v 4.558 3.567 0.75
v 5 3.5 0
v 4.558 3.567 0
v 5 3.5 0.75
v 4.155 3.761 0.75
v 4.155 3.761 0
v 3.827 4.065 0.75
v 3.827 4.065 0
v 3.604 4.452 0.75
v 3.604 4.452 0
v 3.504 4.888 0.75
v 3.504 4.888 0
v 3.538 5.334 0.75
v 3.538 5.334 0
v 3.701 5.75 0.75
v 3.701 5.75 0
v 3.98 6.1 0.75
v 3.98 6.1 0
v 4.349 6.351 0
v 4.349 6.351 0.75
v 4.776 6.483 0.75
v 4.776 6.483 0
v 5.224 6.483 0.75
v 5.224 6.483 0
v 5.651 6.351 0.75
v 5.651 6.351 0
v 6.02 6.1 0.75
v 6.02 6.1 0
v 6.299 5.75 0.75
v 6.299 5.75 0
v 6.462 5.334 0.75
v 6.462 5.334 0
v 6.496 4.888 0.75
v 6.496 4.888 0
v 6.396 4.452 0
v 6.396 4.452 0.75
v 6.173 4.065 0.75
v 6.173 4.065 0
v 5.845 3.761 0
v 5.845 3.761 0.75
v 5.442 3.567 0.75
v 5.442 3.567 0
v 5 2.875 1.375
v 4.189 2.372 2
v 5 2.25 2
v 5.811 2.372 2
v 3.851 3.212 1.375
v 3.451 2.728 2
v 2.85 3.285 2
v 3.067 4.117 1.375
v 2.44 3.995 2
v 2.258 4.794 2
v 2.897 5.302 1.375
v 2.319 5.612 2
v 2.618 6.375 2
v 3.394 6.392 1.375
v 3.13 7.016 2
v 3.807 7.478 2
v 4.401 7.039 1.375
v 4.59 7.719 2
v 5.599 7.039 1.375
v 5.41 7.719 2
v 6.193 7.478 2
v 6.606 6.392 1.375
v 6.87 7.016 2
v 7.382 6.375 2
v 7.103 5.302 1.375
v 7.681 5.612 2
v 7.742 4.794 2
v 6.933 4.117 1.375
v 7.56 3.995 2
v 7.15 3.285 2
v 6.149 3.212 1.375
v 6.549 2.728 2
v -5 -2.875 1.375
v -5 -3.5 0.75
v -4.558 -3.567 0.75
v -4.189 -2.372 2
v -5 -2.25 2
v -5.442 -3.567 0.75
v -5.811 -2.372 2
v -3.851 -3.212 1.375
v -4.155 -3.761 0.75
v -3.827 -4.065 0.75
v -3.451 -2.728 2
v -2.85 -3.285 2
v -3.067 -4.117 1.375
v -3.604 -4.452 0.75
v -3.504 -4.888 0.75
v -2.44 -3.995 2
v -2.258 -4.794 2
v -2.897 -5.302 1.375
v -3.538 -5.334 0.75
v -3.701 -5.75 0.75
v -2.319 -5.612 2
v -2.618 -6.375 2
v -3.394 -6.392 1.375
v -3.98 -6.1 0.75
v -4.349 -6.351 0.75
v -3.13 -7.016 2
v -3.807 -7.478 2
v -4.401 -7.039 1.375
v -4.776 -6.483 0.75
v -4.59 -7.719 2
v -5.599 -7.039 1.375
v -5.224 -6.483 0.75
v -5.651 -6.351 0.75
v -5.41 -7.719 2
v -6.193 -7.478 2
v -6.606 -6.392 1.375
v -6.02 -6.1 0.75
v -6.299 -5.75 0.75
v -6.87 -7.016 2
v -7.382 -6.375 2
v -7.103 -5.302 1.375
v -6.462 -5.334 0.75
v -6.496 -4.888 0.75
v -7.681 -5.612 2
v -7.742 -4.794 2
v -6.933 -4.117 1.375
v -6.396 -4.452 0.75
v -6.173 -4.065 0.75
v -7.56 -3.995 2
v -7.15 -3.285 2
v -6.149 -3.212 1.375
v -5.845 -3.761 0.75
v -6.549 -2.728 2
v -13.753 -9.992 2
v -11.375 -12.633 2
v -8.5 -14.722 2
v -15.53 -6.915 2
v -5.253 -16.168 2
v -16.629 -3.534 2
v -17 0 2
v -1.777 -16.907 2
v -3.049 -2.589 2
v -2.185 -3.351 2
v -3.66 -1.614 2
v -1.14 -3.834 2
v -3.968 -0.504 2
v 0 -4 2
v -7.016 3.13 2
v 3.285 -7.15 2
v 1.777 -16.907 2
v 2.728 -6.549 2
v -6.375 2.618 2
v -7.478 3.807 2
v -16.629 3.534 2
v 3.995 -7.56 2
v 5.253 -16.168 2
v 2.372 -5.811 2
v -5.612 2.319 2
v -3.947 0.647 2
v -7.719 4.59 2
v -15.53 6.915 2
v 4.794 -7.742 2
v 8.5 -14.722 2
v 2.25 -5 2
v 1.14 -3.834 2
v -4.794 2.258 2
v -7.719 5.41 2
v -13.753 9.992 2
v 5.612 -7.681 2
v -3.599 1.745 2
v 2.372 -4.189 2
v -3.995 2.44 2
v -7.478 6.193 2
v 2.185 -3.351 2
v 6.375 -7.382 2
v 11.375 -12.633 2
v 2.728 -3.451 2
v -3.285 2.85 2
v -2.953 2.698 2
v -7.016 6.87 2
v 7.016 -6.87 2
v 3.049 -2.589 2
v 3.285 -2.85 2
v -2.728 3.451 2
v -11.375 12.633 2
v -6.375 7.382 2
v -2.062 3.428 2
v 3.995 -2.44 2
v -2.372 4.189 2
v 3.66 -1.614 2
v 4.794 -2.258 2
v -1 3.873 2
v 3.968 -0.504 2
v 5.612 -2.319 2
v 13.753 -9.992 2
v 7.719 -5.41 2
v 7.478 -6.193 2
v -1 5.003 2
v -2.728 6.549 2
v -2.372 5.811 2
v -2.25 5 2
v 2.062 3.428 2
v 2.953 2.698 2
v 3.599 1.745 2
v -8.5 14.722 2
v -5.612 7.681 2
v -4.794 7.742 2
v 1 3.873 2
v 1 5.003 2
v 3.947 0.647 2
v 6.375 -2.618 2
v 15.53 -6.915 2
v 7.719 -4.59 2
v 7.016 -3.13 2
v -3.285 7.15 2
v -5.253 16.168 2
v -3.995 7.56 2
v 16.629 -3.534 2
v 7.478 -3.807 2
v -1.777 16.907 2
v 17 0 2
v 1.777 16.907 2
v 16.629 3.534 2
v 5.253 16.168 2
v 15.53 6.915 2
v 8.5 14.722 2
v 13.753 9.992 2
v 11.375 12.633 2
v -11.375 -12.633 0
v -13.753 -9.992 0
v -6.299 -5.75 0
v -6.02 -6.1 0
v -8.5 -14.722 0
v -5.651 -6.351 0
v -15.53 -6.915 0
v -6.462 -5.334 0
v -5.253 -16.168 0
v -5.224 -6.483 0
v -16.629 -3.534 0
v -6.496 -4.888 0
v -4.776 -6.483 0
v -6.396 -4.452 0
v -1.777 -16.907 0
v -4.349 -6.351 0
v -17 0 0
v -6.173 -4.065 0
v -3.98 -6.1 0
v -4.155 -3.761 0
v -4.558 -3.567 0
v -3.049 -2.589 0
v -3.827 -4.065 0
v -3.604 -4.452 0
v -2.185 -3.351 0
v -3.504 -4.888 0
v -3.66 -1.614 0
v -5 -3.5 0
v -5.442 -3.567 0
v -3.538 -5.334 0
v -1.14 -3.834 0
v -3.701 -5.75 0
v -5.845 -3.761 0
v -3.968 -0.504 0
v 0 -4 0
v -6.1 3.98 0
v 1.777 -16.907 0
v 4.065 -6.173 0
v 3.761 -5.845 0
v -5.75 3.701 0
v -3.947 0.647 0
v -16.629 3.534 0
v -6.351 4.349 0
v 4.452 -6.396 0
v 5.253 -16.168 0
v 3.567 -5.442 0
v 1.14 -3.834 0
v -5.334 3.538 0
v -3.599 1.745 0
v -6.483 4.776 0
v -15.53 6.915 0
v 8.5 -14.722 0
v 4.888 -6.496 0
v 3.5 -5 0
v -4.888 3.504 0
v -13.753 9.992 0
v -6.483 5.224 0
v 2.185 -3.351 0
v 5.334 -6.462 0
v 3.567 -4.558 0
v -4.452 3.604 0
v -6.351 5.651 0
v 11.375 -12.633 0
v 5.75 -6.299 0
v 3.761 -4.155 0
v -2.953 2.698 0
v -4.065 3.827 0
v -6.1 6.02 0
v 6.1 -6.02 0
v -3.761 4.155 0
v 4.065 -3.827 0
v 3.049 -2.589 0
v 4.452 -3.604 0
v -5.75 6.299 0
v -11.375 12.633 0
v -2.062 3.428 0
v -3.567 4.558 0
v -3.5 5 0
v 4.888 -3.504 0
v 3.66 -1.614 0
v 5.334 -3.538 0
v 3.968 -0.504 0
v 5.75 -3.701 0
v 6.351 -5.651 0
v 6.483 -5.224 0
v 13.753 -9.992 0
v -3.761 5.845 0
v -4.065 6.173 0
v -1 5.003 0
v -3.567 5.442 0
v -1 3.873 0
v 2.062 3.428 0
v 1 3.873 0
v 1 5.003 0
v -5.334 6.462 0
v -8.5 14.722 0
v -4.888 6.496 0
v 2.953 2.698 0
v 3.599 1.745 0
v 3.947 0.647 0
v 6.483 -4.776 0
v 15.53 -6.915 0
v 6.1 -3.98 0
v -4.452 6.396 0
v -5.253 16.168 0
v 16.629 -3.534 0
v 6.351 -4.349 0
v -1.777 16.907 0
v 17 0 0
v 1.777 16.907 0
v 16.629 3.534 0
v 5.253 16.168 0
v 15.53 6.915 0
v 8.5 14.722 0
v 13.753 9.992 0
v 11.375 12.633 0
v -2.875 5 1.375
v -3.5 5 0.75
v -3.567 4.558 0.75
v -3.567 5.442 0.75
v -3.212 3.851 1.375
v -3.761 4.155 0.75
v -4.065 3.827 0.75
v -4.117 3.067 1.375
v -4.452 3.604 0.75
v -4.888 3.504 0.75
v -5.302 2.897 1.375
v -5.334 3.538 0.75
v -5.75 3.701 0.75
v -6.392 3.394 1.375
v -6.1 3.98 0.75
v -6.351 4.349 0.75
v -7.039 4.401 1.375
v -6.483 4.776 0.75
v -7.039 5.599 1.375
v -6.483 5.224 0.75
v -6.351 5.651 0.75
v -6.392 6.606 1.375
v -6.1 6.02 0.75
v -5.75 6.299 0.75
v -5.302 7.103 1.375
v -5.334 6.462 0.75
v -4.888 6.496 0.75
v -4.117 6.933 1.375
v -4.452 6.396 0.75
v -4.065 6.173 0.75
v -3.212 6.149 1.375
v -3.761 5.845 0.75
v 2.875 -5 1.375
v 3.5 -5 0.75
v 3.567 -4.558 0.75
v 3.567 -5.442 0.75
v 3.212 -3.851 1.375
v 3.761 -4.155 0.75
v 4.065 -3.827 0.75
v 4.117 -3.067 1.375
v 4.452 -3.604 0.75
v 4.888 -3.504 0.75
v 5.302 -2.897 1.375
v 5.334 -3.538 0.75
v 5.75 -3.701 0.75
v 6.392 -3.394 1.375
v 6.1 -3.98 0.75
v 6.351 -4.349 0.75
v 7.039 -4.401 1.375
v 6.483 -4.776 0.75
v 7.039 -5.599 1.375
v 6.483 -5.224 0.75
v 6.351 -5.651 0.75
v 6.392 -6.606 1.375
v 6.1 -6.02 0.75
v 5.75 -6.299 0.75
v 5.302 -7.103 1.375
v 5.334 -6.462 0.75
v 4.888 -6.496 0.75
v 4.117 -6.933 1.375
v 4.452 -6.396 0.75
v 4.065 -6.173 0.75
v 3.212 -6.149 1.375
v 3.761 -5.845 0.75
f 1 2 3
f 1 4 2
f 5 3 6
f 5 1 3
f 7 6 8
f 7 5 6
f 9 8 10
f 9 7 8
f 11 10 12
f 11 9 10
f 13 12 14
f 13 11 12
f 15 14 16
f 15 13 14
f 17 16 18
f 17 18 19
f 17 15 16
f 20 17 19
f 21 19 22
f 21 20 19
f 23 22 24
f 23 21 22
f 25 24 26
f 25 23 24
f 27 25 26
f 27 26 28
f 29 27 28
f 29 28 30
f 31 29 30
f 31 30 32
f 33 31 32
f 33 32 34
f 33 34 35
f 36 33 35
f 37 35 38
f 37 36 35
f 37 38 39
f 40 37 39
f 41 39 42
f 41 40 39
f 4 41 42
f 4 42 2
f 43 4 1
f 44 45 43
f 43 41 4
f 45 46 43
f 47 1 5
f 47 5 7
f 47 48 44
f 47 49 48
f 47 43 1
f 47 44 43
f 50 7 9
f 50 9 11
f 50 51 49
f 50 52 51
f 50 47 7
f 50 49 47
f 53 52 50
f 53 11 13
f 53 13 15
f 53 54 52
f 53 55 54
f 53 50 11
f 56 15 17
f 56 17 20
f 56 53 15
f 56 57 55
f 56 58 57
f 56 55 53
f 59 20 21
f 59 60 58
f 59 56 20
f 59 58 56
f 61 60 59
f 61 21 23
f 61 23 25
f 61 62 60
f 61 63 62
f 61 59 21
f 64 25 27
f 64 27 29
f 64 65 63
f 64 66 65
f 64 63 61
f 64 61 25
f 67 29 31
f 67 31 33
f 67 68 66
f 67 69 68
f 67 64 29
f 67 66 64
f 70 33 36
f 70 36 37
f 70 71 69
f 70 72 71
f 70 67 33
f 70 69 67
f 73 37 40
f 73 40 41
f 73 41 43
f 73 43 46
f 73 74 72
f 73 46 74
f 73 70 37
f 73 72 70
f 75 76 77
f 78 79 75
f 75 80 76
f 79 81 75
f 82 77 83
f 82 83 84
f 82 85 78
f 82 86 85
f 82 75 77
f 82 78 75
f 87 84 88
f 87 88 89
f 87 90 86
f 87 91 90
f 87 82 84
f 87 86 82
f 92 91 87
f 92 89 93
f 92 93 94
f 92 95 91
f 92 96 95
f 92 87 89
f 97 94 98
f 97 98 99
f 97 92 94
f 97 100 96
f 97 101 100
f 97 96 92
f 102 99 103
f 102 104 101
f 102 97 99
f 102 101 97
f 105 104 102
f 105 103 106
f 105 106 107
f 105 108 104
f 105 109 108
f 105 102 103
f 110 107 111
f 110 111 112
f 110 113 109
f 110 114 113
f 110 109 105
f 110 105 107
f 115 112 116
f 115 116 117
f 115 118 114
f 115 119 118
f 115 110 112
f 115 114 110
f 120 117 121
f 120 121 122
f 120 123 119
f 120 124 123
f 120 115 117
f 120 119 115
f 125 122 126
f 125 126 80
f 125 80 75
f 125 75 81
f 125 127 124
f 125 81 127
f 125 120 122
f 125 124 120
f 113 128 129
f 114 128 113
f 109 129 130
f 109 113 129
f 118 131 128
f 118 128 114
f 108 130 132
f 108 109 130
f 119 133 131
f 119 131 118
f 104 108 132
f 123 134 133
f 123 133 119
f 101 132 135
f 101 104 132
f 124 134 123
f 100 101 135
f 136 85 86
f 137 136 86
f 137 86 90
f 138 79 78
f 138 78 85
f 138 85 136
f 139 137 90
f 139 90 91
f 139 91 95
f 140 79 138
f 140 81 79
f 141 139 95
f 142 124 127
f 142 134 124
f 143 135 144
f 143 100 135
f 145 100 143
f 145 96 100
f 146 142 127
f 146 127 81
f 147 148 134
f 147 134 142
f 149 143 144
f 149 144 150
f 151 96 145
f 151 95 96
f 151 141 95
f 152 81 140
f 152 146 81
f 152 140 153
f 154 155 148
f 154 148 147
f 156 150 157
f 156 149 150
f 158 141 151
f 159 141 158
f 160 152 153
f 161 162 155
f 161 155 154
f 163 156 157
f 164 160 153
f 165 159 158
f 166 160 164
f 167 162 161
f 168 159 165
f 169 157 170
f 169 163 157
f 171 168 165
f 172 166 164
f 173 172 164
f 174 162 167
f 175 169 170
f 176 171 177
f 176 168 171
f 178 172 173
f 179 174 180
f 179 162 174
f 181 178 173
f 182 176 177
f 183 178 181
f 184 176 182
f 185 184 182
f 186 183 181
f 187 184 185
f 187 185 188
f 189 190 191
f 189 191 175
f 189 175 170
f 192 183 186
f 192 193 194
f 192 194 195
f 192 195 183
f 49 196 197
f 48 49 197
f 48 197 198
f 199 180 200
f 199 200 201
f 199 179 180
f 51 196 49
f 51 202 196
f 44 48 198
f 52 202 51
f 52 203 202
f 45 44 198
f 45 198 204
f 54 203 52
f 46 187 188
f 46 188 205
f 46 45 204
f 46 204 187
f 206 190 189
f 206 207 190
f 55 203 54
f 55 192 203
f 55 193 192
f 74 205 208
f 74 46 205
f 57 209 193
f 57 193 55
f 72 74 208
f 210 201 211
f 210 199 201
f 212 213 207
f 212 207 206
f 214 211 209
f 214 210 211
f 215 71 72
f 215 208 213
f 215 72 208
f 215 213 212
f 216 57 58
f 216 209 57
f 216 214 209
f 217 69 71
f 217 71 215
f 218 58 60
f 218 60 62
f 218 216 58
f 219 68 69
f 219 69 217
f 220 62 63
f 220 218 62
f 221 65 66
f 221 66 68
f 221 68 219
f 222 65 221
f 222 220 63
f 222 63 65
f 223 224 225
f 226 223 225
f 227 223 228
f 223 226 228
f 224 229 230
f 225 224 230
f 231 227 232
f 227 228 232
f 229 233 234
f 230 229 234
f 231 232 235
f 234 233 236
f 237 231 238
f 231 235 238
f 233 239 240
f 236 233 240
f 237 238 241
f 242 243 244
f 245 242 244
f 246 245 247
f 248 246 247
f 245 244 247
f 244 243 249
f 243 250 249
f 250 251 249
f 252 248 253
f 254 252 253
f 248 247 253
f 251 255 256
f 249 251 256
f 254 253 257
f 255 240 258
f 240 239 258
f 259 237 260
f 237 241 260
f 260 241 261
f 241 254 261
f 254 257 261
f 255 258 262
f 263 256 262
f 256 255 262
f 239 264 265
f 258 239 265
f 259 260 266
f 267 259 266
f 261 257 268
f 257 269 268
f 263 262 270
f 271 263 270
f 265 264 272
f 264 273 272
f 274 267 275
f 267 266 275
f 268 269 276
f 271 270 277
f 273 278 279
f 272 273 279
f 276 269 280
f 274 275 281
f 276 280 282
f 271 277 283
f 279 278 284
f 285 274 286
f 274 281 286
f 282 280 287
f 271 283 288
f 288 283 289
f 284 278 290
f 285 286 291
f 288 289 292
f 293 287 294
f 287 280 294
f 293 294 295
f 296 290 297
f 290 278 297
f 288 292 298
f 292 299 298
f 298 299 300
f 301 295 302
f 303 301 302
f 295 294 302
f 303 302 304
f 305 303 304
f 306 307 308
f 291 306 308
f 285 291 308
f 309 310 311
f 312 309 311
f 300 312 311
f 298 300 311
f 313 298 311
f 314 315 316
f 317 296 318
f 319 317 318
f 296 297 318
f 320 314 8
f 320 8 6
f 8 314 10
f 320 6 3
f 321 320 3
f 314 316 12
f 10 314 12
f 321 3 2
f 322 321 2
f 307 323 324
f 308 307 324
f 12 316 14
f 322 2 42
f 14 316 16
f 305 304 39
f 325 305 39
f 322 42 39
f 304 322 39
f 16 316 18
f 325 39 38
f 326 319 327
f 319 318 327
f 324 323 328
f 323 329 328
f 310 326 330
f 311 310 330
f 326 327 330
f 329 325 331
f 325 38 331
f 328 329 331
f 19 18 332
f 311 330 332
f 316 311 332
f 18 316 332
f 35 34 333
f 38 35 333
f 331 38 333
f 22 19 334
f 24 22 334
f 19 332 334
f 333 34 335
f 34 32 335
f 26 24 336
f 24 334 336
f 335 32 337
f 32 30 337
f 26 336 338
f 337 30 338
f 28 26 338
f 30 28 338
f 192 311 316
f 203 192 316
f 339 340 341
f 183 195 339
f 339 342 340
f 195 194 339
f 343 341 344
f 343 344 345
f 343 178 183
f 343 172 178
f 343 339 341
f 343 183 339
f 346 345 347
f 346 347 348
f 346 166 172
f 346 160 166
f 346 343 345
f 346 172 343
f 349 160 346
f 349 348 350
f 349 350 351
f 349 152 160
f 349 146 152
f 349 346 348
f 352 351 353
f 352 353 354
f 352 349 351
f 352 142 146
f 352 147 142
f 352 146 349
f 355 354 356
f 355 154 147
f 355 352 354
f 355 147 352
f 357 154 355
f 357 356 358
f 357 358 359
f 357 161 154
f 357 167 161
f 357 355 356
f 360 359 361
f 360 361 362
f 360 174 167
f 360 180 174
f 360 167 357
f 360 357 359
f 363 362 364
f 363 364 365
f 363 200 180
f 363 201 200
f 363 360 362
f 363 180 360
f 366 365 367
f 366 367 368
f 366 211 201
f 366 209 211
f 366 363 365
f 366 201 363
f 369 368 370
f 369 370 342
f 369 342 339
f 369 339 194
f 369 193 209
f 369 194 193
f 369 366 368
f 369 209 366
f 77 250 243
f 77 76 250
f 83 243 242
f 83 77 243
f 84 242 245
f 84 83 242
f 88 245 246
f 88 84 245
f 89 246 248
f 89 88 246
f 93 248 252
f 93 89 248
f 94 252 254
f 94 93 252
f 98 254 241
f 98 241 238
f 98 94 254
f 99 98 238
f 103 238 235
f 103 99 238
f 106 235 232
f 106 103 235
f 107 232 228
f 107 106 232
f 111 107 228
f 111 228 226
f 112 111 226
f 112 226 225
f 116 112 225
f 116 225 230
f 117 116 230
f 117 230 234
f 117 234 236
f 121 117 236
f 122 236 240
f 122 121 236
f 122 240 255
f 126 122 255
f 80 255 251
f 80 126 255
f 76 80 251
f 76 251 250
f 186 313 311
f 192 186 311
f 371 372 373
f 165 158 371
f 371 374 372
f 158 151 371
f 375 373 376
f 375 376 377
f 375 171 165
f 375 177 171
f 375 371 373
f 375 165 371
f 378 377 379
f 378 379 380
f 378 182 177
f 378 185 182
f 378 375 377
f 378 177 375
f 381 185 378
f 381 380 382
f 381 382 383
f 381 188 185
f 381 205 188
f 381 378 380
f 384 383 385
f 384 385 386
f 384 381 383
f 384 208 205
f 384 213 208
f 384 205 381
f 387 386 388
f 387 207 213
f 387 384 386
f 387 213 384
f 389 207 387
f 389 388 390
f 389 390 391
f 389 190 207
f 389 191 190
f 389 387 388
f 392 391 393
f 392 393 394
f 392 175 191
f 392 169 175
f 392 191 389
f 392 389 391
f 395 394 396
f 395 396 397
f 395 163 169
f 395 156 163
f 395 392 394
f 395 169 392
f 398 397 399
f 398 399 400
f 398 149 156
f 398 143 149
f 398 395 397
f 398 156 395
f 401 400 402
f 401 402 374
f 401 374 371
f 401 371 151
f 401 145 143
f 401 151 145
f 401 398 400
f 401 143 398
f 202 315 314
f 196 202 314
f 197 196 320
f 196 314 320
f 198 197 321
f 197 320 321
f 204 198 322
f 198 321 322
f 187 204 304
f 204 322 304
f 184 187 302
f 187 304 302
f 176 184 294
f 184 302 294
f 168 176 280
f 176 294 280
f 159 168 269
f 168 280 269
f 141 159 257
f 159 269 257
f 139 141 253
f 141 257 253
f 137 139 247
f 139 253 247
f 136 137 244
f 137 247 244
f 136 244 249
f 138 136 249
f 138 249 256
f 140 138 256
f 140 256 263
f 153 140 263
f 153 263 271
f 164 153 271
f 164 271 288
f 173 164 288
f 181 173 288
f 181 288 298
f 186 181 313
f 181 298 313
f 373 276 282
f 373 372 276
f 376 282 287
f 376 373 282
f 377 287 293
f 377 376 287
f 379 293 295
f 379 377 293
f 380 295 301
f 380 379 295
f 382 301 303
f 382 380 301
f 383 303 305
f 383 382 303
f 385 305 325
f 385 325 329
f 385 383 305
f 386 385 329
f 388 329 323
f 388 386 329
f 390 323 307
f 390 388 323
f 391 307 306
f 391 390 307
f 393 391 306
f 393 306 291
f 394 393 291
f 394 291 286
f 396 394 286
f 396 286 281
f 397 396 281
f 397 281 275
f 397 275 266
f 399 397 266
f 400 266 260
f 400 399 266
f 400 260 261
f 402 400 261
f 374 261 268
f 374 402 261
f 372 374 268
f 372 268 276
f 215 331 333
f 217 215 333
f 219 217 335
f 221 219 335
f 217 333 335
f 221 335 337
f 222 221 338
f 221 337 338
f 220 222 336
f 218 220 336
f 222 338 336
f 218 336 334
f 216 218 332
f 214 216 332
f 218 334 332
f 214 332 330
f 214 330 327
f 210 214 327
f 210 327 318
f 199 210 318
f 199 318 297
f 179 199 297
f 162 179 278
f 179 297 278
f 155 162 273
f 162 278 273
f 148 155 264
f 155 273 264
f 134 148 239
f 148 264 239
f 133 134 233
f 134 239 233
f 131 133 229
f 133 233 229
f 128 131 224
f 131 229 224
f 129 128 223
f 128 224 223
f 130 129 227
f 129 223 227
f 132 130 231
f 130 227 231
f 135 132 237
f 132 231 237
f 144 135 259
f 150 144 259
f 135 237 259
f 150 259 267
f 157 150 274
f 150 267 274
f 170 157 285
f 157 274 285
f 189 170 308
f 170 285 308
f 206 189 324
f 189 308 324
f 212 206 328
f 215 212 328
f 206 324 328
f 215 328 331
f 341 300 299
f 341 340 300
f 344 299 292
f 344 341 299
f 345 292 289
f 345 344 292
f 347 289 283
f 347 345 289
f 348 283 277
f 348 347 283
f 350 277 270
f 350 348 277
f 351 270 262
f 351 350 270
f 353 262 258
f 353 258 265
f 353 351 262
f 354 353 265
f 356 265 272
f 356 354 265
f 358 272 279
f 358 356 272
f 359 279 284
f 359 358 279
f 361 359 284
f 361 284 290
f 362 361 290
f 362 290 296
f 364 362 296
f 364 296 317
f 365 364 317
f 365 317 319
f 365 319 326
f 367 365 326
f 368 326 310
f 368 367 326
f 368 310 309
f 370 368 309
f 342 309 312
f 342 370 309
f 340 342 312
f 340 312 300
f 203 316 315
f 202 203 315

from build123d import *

# Parameters (mm, degrees)
SKETCH1_R           = 17
BOSS_EXTRUDE1_DEPTH = 2
CIRPATTERN1_COUNT   = 4


with BuildPart() as part:
    # Sketch1 → Boss-Extrude1 (new body)
    with BuildSketch(Plane.XY):
        Circle(SKETCH1_R)
        with BuildLine():
            Line((-1, 3.872983346), (-1, 5.002983346))
            Line((-1, 5.002983346), (1, 5.002983346))
            Line((1, 5.002983346), (1, 3.872983346))
            ThreePointArc((1, 3.872983346), (0, -4), (-1, 3.872983346))
        make_face(mode=Mode.SUBTRACT)
    extrude(amount=BOSS_EXTRUDE1_DEPTH)

    # Sketch4 → CSK for M2.5 Flat Head Machine Screw1 (revolve, cut)
    with BuildSketch(Plane(origin=(5, 5, 2), x_dir=(0, -1, 0), z_dir=(1, 0, 0))):
        Polygon((0, 0), (0, 2), (1.5, 2), (1.5, 1.25), (2.75, 0), align=None)
    csk_for_m2_5_flat_head_machine_screw1 = revolve(axis=Axis((5, 5, 8.35), (0, 0, -1)), mode=Mode.SUBTRACT)

    # CirPattern1: CSK for M2.5 Flat Head Machine Screw1 ×4 about axis
    cirpattern1_axis = Axis((0, 0, 0), (0, 0, 1))
    for i in range(1, CIRPATTERN1_COUNT):
        add(csk_for_m2_5_flat_head_machine_screw1.rotate(cirpattern1_axis, i * 360 / CIRPATTERN1_COUNT), mode=Mode.SUBTRACT)


solid = part.part
